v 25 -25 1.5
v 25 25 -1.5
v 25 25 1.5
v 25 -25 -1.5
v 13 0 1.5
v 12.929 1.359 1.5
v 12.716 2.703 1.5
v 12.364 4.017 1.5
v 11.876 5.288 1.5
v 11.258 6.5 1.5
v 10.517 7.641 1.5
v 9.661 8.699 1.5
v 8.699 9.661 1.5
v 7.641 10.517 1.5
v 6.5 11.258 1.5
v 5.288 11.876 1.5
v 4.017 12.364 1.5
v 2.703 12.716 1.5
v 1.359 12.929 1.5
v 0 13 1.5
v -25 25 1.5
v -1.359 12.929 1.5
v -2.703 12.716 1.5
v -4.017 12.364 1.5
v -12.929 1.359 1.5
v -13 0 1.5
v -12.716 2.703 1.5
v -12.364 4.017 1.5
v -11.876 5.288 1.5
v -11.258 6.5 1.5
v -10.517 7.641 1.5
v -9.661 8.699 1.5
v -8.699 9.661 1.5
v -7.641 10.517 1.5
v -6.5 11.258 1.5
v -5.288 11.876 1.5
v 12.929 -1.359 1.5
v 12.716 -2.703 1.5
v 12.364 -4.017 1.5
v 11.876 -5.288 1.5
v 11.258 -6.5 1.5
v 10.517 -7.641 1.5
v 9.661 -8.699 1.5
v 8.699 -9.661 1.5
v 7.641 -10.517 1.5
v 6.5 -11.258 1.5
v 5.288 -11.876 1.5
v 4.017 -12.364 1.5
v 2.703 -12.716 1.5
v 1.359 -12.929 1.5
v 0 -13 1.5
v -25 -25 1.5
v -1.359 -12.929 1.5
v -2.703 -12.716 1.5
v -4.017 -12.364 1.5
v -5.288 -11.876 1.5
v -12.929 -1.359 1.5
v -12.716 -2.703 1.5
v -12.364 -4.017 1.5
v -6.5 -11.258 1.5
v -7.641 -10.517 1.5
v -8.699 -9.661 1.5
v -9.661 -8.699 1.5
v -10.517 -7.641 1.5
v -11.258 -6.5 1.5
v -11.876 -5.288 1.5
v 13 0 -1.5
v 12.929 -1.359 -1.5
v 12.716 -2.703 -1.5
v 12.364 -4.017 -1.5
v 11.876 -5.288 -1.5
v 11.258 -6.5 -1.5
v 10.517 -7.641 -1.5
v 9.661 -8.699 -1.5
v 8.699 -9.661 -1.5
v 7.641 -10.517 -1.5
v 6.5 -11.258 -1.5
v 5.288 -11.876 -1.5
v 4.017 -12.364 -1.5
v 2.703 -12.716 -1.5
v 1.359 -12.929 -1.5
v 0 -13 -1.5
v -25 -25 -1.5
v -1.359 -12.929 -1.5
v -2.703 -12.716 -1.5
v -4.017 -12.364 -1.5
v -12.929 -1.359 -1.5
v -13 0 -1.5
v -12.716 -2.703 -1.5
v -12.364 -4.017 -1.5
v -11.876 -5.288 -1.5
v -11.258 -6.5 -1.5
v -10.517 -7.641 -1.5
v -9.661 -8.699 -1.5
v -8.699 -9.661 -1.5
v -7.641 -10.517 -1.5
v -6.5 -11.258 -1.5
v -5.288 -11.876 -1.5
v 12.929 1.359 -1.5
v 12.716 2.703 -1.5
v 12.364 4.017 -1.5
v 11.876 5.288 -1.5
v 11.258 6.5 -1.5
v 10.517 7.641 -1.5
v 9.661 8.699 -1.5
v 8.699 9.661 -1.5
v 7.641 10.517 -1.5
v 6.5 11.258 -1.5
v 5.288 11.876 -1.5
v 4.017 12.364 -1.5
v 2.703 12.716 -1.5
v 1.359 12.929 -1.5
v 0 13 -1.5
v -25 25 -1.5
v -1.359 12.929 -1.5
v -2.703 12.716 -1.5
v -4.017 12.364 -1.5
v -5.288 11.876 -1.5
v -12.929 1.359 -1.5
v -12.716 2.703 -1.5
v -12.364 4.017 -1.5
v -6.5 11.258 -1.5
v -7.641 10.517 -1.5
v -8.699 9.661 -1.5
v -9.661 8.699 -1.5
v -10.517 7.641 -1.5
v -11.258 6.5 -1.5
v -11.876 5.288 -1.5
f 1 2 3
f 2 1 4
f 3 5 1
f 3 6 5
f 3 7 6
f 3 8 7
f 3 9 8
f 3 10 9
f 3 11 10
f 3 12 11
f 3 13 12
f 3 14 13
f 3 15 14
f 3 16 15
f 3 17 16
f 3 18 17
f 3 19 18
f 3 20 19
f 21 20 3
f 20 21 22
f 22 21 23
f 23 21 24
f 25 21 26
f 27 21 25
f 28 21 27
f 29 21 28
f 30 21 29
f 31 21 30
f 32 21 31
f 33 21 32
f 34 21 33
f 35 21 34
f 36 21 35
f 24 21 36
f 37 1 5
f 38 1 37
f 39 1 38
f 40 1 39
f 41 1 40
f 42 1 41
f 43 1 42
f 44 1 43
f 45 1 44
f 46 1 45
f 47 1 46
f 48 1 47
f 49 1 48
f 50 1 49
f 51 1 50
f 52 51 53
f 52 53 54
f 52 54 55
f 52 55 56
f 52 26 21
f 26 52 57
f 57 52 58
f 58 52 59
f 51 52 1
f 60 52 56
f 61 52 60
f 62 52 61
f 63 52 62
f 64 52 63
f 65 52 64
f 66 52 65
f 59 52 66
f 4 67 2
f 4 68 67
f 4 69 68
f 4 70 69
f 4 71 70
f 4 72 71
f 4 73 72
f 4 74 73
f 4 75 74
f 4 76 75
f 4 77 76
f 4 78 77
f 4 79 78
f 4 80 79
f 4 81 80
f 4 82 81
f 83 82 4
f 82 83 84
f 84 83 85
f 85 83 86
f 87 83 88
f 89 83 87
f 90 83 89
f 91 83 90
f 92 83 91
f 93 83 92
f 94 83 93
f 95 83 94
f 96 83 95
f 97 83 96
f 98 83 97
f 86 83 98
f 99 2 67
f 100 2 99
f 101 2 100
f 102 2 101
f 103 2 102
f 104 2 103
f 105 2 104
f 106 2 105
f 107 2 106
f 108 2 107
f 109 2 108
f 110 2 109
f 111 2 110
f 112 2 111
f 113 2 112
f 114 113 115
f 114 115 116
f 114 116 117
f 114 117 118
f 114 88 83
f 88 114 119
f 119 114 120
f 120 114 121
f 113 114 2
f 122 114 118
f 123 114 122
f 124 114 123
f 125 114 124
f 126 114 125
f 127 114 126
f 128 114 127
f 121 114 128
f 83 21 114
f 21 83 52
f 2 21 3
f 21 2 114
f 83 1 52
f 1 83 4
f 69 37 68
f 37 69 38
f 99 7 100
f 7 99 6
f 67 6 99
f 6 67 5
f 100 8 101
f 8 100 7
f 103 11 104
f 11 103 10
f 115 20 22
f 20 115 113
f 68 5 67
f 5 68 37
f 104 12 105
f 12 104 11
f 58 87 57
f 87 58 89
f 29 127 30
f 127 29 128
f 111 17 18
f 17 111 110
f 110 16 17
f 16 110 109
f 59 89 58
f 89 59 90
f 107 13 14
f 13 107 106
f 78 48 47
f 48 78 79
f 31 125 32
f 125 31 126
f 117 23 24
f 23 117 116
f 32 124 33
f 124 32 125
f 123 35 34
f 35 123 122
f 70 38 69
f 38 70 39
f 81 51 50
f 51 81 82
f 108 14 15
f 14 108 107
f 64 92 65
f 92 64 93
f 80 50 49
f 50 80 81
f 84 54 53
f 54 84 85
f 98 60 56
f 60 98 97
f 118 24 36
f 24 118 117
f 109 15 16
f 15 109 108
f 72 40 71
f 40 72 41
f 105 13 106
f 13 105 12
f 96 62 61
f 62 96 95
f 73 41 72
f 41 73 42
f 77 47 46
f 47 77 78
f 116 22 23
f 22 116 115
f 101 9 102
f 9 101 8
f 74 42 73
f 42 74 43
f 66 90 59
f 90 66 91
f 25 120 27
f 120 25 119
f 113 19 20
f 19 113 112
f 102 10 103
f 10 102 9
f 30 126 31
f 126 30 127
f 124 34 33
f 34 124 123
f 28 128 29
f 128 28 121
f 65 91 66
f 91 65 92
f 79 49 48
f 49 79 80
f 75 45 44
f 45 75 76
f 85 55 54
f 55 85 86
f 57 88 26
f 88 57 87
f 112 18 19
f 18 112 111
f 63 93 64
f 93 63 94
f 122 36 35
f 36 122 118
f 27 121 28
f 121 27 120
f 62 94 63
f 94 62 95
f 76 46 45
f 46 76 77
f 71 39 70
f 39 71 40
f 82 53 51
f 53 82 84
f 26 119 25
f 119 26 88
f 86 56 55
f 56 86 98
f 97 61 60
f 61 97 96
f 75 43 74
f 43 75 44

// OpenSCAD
// Square mounting washer.
$fn = 60;
eps = 0.02;
hole_d = 26;
side = 50;
thickness = 3;
difference() {
    cube([side,side,thickness],center=true);
    translate([0,0,-thickness/2-eps]) cylinder(d=hole_d,h=thickness+2*eps);
}
